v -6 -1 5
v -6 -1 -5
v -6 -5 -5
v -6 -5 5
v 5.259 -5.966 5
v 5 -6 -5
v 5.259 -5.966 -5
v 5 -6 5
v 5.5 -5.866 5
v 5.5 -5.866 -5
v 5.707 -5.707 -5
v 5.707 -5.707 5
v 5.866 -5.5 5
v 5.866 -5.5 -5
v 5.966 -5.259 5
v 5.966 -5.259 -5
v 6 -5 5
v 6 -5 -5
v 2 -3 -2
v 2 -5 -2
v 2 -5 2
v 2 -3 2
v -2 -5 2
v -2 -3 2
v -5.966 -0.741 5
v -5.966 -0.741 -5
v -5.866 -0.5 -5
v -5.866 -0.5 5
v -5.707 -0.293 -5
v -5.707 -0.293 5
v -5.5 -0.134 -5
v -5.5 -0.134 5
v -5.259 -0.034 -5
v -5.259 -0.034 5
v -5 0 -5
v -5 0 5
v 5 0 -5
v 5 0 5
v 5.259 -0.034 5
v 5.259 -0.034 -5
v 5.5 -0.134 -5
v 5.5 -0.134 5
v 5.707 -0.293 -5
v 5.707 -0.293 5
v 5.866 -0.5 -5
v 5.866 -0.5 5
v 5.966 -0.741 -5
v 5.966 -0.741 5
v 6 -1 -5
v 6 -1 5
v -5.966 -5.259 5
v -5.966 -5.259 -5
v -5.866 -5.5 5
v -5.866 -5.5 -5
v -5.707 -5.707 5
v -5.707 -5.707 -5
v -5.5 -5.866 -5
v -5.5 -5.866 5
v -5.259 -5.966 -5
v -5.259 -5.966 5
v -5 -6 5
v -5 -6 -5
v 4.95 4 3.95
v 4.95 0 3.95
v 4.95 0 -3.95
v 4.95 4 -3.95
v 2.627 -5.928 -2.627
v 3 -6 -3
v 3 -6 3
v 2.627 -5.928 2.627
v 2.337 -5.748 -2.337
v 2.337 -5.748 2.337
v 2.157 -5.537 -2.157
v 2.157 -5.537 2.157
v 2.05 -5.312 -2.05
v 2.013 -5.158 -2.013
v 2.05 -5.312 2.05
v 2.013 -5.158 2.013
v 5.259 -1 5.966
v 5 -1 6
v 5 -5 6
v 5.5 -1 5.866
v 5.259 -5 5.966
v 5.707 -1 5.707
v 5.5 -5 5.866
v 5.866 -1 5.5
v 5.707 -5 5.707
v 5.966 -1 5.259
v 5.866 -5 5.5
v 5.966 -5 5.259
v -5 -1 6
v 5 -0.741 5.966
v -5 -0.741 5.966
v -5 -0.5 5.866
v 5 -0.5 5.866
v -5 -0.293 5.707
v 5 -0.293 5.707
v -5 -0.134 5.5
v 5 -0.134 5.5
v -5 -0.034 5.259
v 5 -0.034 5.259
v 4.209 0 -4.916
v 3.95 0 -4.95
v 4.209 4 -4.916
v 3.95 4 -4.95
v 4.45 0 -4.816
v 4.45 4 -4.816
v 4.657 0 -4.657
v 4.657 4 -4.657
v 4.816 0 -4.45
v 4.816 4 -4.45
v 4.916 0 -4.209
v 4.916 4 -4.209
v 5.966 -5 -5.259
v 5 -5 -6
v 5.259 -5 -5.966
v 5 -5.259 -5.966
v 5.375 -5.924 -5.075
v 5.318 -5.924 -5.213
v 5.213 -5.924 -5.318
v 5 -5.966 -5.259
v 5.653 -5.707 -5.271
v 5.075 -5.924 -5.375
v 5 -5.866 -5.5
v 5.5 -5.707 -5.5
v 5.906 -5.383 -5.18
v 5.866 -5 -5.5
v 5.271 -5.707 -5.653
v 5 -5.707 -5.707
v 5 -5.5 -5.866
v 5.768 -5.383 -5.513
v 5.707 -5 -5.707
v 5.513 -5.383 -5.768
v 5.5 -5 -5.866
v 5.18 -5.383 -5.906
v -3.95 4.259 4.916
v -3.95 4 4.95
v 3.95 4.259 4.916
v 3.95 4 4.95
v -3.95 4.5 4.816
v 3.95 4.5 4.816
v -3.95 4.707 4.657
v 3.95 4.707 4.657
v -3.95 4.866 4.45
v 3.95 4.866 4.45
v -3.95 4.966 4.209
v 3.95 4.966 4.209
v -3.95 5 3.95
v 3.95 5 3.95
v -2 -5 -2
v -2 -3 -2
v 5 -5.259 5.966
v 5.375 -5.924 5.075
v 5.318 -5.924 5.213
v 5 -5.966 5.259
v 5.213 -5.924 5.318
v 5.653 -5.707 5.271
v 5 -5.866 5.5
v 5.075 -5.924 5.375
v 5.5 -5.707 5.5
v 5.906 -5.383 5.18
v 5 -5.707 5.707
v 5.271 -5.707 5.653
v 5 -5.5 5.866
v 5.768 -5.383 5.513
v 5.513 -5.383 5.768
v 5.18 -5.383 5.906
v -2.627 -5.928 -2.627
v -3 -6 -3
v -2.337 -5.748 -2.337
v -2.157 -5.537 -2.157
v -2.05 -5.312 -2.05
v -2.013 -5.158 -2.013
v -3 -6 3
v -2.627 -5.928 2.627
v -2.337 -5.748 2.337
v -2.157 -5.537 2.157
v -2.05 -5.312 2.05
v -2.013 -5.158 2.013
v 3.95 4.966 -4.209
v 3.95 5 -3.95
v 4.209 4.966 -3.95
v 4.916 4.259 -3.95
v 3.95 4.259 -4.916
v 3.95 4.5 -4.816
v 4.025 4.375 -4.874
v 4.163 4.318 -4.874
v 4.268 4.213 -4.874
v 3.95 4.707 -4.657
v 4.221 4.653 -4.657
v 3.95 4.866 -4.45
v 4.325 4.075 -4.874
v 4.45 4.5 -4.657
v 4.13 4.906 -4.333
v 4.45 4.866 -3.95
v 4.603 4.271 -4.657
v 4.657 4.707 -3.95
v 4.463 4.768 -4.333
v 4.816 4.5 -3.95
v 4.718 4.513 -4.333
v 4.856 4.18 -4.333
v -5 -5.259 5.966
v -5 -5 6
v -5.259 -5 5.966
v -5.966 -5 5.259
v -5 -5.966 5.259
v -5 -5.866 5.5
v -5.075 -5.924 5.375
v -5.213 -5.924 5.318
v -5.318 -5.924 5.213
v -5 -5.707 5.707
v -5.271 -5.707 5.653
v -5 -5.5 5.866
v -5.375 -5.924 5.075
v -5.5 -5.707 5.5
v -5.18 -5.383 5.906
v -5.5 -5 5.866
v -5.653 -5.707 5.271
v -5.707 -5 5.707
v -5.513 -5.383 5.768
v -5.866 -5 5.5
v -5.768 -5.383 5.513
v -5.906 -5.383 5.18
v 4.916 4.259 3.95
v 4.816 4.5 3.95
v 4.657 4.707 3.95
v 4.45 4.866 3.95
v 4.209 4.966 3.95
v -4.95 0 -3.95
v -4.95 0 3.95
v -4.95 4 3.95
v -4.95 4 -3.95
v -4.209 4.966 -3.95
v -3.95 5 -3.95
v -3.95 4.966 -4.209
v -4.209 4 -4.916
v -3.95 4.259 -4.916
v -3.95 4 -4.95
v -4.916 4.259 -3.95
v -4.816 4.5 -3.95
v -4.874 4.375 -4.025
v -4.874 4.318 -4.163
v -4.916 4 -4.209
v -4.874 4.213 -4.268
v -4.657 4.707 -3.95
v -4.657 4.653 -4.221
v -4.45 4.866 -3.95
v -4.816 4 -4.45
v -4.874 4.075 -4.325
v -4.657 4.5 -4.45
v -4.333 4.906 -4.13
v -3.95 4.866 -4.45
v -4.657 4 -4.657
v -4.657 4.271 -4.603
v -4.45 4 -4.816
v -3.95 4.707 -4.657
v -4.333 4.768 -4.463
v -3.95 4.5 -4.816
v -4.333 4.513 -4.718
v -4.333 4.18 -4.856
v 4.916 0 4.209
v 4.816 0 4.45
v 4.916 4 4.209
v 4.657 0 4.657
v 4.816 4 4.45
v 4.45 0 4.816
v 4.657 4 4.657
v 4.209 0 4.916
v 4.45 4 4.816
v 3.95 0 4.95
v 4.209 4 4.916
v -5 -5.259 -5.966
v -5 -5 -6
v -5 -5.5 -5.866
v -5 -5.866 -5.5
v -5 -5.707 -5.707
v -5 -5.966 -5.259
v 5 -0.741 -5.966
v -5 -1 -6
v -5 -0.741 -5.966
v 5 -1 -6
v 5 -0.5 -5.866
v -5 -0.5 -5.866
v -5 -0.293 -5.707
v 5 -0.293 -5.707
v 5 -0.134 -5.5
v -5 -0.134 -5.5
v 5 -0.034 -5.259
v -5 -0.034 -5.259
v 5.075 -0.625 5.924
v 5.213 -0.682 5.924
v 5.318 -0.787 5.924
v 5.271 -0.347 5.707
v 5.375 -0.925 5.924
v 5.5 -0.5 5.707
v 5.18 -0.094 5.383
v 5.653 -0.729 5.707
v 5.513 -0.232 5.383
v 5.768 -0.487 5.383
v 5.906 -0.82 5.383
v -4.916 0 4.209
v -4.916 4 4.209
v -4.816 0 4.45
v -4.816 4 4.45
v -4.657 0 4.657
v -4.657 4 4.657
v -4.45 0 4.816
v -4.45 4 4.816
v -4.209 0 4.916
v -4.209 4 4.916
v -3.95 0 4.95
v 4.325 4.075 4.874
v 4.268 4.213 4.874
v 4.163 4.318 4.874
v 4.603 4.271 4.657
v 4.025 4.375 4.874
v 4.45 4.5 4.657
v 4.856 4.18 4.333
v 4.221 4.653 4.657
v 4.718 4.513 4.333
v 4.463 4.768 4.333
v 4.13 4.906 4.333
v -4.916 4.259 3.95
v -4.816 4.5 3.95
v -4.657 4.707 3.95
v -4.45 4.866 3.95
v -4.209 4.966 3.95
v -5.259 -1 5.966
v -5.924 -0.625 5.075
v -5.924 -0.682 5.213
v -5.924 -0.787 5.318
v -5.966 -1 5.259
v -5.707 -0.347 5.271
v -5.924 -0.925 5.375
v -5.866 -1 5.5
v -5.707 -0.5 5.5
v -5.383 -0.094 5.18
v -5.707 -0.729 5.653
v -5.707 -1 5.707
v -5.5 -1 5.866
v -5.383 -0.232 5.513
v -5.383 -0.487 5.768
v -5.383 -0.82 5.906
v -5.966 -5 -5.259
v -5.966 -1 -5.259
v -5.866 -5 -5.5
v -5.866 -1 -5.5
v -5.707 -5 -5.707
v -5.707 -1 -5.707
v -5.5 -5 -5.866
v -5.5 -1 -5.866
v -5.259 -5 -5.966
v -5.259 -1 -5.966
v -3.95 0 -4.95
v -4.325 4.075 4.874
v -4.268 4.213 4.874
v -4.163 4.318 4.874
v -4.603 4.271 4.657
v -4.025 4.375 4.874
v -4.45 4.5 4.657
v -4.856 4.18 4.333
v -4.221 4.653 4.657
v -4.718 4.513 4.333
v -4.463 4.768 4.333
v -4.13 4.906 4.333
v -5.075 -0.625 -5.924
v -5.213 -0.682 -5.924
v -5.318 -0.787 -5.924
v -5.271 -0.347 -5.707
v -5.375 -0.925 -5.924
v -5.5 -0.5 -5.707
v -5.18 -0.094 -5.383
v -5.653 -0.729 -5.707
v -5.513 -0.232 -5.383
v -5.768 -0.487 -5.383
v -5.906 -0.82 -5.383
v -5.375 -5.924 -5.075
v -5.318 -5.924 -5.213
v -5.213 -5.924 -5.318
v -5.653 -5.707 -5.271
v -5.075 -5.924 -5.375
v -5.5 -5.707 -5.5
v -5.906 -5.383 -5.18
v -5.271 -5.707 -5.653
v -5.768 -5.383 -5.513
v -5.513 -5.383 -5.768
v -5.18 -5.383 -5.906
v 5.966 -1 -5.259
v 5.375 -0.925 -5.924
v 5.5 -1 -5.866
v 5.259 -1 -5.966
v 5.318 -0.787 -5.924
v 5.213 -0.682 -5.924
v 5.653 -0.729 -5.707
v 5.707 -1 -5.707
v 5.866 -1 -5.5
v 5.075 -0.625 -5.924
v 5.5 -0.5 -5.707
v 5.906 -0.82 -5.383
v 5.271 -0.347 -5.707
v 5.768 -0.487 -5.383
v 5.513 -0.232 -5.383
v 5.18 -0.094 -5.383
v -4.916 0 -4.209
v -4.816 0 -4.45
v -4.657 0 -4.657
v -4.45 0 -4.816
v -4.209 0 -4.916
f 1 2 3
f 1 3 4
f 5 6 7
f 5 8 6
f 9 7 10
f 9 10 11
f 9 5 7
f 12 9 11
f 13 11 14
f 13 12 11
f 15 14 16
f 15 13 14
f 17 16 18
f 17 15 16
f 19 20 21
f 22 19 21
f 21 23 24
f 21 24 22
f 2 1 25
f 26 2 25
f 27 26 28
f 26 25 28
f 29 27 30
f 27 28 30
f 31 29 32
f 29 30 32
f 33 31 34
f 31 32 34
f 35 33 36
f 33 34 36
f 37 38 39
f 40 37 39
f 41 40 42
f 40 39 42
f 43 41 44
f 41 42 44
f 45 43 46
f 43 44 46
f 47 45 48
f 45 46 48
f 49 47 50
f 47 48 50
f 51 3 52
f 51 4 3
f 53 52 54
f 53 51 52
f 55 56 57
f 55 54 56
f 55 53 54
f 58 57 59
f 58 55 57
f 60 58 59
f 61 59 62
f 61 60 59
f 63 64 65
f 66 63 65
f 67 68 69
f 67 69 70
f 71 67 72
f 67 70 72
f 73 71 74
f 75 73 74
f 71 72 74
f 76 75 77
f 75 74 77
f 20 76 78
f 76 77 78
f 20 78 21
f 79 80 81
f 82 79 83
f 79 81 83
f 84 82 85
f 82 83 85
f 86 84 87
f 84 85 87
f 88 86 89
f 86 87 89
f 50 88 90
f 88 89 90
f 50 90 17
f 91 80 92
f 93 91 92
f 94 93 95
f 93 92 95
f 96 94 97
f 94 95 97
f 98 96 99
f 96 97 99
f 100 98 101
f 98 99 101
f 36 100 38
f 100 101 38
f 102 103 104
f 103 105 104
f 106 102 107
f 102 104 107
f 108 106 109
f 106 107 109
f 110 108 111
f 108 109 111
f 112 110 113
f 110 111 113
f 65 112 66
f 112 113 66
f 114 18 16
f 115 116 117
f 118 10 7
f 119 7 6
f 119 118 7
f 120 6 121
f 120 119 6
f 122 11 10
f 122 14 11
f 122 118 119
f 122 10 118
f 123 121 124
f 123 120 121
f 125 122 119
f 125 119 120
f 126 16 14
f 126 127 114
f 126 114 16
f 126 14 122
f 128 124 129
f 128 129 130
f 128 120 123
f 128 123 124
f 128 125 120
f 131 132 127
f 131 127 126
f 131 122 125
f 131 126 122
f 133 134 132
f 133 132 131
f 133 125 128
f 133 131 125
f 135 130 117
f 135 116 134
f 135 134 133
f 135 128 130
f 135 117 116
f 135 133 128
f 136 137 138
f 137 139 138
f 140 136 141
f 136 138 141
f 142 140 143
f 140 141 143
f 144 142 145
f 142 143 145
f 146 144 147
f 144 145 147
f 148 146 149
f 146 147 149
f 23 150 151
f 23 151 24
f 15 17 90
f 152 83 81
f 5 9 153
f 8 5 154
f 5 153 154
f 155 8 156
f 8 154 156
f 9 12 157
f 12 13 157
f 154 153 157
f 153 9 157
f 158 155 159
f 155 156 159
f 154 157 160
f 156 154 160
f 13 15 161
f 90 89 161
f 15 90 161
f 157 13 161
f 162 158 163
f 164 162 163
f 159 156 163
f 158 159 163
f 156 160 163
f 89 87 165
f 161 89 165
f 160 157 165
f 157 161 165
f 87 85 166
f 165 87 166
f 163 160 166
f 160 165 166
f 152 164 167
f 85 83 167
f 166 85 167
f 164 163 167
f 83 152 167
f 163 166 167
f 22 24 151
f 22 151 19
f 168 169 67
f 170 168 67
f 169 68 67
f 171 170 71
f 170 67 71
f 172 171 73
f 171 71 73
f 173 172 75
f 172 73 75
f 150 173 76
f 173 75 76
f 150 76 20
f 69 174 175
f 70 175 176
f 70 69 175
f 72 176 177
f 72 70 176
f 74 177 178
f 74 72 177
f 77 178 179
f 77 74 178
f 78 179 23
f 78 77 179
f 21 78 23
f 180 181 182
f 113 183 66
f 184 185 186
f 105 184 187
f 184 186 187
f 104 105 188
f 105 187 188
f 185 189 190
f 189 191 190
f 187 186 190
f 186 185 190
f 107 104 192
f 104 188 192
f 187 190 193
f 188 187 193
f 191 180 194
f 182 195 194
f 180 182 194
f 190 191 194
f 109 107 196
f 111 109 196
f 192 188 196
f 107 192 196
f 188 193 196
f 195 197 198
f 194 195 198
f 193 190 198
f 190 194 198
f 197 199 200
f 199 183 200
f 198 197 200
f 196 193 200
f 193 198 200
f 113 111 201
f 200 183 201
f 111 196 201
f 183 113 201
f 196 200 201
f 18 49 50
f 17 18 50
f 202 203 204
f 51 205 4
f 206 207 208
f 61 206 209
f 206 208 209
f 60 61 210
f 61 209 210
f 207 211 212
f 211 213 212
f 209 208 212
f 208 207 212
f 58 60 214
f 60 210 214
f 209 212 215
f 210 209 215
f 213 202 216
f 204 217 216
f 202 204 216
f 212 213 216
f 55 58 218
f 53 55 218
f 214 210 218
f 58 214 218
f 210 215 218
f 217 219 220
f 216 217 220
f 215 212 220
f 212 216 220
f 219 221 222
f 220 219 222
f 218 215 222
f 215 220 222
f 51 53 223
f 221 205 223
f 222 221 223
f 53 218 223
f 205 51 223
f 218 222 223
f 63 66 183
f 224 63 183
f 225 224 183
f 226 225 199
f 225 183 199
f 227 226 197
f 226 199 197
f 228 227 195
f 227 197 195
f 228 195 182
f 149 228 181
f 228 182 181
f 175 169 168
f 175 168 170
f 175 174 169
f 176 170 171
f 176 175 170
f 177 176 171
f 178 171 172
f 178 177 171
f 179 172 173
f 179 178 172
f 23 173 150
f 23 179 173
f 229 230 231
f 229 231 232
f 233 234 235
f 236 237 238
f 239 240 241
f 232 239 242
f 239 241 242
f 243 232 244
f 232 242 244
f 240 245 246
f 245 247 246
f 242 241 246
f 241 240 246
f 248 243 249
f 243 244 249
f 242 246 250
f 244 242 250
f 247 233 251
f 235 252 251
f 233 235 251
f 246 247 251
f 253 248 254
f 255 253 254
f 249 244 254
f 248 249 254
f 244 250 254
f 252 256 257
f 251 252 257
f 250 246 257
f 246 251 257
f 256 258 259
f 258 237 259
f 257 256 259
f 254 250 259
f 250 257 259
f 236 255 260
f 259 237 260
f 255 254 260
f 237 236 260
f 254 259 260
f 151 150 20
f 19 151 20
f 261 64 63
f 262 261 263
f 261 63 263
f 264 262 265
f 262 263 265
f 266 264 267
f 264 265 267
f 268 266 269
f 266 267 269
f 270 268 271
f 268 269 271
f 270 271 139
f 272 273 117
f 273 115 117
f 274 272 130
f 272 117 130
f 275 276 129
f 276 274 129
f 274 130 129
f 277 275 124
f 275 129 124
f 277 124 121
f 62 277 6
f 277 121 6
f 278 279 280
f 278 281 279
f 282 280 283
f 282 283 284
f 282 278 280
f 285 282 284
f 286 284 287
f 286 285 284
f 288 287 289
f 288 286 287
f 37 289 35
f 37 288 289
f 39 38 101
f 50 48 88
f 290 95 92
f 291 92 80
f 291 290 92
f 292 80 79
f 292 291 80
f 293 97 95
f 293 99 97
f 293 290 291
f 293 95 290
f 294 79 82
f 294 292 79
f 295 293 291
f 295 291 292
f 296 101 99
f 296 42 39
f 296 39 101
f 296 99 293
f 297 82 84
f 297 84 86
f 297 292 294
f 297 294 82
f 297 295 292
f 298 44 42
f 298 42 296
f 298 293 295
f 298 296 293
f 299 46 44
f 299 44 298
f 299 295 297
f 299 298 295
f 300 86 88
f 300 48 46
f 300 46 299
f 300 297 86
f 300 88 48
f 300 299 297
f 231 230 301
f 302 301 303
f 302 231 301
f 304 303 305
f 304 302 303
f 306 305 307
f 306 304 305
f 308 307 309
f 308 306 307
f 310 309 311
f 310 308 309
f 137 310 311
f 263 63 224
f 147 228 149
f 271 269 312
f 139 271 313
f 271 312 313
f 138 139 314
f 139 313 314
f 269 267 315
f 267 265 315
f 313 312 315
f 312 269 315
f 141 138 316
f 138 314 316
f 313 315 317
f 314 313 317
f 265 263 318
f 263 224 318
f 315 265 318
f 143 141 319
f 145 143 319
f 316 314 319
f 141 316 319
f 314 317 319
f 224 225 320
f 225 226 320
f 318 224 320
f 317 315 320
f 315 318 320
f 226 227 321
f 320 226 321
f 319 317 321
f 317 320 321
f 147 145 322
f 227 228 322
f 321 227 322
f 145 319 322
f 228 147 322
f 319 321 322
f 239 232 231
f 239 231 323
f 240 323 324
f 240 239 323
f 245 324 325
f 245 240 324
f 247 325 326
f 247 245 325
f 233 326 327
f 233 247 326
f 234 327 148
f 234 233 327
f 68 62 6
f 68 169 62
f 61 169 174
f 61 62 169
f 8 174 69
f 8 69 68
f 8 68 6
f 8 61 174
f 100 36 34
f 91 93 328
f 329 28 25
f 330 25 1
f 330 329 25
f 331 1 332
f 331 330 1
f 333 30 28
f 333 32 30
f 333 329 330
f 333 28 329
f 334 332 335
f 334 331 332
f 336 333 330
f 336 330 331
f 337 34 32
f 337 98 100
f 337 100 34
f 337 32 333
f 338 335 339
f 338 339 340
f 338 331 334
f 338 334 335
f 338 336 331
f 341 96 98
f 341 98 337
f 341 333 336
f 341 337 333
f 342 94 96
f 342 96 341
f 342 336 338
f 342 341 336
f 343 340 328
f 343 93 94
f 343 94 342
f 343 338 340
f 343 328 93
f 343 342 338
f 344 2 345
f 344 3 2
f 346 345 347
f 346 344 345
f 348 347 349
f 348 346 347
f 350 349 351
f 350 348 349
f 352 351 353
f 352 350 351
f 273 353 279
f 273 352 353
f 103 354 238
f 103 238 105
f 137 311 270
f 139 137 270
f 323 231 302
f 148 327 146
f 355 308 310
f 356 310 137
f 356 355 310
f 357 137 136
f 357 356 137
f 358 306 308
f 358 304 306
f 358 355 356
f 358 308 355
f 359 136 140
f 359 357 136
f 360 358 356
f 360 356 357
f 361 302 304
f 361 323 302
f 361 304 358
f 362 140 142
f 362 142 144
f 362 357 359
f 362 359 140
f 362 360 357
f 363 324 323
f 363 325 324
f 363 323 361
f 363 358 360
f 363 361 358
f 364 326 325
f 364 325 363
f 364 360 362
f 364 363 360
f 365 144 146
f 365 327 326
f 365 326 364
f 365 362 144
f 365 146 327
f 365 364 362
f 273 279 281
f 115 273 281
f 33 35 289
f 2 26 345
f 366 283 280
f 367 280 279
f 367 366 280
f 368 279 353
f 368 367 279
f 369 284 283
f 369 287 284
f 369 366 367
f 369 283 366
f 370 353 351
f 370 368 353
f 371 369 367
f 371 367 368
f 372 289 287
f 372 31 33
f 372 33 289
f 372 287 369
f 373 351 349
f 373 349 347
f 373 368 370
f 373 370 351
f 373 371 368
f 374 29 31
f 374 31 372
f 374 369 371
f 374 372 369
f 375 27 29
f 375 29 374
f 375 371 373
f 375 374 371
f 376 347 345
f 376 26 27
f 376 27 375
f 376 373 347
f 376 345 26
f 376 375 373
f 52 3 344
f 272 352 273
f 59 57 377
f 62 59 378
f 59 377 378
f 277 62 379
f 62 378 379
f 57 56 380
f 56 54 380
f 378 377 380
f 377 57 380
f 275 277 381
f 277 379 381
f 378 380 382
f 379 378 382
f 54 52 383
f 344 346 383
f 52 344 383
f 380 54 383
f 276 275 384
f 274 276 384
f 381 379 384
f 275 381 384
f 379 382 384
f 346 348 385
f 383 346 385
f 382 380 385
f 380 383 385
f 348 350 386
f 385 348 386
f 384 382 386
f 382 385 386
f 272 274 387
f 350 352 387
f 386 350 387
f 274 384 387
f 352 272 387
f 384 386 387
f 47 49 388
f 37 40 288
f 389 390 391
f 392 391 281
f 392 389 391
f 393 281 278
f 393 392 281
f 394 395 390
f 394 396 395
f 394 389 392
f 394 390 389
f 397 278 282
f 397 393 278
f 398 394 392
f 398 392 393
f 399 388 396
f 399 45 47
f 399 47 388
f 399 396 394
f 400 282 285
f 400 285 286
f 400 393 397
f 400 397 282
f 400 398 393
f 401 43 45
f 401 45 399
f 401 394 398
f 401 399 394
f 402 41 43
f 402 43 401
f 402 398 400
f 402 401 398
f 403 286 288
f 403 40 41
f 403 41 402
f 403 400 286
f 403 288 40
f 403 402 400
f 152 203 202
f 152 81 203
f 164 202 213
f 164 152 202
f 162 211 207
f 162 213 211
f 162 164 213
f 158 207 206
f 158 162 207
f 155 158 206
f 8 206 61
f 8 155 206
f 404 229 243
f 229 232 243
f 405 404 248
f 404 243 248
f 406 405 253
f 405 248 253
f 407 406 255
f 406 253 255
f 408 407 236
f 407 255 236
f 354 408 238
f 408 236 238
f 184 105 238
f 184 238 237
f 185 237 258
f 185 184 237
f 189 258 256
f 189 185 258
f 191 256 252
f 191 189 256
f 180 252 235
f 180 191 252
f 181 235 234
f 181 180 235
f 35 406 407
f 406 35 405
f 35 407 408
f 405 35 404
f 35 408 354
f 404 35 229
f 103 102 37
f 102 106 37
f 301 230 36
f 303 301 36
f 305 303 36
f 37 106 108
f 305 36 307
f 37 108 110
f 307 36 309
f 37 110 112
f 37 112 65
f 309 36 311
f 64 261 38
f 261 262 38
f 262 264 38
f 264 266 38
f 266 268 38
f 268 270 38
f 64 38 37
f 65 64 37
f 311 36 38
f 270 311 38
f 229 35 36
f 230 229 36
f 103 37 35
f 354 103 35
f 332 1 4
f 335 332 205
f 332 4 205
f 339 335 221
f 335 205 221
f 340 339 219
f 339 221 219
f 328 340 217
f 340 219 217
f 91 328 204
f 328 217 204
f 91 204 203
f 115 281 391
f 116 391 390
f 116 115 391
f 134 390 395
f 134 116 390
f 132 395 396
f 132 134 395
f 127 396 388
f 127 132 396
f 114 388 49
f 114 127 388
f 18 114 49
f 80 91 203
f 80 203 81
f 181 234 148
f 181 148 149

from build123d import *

# Parameters (mm, degrees)
SKETCH1_W           = 9.9
SKETCH1_H           = 9.9
BOSS_EXTRUDE1_DEPTH = 5
SKETCH2_W           = 12
SKETCH2_H           = 12
BOSS_EXTRUDE2_DEPTH = 6
SKETCH3_W           = 4
SKETCH3_H           = 4
CUT_EXTRUDE1_DEPTH  = 3
FILLET1_R           = 1


with BuildPart() as part:
    # Sketch1 → Boss-Extrude1 (new body)
    with BuildSketch(Plane(origin=(0, 0, 0), x_dir=(1, 0, 0), z_dir=(0, 1, 0))):
        Rectangle(SKETCH1_W, SKETCH1_H)
    extrude(amount=BOSS_EXTRUDE1_DEPTH)

    # Sketch2 → Boss-Extrude2 (add)
    with BuildSketch(Plane.XZ):
        Rectangle(SKETCH2_W, SKETCH2_H)
    extrude(amount=BOSS_EXTRUDE2_DEPTH)

    # Sketch3 → Cut-Extrude1 (cut)
    with BuildSketch(Plane.XZ.offset(6)):
        Rectangle(SKETCH3_W, SKETCH3_H)
    extrude(amount=-CUT_EXTRUDE1_DEPTH, mode=Mode.SUBTRACT)

    # Fillet1
    fillet1_edges = [part.edges().sort_by_distance(p)[0] for p in [
        (4.95, 5, 0),
        (6, 0, 0),
        (6, -3, -6),
        (0, 0, 6),
        (6, -3, 6),
        (-6, 0, 0),
        (-6, -3, 6),
        (0, 0, -6),
        (-6, -3, -6),
        (6, -6, 0),
        (0, -6, 6),
        (-6, -6, 0),
        (0, -6, -6),
        (0, 5, -4.95),
        (-2, -6, 0),
        (0, -6, -2),
        (2, -6, 0),
        (0, -6, 2),
        (-4.95, 5, 0),
        (-4.95, 2.5, -4.95),
        (4.95, 2.5, -4.95),
        (4.95, 2.5, 4.95),
        (-4.95, 2.5, 4.95),
        (0, 5, 4.95),
    ]]
    fillet(fillet1_edges, radius=FILLET1_R)


solid = part.part
